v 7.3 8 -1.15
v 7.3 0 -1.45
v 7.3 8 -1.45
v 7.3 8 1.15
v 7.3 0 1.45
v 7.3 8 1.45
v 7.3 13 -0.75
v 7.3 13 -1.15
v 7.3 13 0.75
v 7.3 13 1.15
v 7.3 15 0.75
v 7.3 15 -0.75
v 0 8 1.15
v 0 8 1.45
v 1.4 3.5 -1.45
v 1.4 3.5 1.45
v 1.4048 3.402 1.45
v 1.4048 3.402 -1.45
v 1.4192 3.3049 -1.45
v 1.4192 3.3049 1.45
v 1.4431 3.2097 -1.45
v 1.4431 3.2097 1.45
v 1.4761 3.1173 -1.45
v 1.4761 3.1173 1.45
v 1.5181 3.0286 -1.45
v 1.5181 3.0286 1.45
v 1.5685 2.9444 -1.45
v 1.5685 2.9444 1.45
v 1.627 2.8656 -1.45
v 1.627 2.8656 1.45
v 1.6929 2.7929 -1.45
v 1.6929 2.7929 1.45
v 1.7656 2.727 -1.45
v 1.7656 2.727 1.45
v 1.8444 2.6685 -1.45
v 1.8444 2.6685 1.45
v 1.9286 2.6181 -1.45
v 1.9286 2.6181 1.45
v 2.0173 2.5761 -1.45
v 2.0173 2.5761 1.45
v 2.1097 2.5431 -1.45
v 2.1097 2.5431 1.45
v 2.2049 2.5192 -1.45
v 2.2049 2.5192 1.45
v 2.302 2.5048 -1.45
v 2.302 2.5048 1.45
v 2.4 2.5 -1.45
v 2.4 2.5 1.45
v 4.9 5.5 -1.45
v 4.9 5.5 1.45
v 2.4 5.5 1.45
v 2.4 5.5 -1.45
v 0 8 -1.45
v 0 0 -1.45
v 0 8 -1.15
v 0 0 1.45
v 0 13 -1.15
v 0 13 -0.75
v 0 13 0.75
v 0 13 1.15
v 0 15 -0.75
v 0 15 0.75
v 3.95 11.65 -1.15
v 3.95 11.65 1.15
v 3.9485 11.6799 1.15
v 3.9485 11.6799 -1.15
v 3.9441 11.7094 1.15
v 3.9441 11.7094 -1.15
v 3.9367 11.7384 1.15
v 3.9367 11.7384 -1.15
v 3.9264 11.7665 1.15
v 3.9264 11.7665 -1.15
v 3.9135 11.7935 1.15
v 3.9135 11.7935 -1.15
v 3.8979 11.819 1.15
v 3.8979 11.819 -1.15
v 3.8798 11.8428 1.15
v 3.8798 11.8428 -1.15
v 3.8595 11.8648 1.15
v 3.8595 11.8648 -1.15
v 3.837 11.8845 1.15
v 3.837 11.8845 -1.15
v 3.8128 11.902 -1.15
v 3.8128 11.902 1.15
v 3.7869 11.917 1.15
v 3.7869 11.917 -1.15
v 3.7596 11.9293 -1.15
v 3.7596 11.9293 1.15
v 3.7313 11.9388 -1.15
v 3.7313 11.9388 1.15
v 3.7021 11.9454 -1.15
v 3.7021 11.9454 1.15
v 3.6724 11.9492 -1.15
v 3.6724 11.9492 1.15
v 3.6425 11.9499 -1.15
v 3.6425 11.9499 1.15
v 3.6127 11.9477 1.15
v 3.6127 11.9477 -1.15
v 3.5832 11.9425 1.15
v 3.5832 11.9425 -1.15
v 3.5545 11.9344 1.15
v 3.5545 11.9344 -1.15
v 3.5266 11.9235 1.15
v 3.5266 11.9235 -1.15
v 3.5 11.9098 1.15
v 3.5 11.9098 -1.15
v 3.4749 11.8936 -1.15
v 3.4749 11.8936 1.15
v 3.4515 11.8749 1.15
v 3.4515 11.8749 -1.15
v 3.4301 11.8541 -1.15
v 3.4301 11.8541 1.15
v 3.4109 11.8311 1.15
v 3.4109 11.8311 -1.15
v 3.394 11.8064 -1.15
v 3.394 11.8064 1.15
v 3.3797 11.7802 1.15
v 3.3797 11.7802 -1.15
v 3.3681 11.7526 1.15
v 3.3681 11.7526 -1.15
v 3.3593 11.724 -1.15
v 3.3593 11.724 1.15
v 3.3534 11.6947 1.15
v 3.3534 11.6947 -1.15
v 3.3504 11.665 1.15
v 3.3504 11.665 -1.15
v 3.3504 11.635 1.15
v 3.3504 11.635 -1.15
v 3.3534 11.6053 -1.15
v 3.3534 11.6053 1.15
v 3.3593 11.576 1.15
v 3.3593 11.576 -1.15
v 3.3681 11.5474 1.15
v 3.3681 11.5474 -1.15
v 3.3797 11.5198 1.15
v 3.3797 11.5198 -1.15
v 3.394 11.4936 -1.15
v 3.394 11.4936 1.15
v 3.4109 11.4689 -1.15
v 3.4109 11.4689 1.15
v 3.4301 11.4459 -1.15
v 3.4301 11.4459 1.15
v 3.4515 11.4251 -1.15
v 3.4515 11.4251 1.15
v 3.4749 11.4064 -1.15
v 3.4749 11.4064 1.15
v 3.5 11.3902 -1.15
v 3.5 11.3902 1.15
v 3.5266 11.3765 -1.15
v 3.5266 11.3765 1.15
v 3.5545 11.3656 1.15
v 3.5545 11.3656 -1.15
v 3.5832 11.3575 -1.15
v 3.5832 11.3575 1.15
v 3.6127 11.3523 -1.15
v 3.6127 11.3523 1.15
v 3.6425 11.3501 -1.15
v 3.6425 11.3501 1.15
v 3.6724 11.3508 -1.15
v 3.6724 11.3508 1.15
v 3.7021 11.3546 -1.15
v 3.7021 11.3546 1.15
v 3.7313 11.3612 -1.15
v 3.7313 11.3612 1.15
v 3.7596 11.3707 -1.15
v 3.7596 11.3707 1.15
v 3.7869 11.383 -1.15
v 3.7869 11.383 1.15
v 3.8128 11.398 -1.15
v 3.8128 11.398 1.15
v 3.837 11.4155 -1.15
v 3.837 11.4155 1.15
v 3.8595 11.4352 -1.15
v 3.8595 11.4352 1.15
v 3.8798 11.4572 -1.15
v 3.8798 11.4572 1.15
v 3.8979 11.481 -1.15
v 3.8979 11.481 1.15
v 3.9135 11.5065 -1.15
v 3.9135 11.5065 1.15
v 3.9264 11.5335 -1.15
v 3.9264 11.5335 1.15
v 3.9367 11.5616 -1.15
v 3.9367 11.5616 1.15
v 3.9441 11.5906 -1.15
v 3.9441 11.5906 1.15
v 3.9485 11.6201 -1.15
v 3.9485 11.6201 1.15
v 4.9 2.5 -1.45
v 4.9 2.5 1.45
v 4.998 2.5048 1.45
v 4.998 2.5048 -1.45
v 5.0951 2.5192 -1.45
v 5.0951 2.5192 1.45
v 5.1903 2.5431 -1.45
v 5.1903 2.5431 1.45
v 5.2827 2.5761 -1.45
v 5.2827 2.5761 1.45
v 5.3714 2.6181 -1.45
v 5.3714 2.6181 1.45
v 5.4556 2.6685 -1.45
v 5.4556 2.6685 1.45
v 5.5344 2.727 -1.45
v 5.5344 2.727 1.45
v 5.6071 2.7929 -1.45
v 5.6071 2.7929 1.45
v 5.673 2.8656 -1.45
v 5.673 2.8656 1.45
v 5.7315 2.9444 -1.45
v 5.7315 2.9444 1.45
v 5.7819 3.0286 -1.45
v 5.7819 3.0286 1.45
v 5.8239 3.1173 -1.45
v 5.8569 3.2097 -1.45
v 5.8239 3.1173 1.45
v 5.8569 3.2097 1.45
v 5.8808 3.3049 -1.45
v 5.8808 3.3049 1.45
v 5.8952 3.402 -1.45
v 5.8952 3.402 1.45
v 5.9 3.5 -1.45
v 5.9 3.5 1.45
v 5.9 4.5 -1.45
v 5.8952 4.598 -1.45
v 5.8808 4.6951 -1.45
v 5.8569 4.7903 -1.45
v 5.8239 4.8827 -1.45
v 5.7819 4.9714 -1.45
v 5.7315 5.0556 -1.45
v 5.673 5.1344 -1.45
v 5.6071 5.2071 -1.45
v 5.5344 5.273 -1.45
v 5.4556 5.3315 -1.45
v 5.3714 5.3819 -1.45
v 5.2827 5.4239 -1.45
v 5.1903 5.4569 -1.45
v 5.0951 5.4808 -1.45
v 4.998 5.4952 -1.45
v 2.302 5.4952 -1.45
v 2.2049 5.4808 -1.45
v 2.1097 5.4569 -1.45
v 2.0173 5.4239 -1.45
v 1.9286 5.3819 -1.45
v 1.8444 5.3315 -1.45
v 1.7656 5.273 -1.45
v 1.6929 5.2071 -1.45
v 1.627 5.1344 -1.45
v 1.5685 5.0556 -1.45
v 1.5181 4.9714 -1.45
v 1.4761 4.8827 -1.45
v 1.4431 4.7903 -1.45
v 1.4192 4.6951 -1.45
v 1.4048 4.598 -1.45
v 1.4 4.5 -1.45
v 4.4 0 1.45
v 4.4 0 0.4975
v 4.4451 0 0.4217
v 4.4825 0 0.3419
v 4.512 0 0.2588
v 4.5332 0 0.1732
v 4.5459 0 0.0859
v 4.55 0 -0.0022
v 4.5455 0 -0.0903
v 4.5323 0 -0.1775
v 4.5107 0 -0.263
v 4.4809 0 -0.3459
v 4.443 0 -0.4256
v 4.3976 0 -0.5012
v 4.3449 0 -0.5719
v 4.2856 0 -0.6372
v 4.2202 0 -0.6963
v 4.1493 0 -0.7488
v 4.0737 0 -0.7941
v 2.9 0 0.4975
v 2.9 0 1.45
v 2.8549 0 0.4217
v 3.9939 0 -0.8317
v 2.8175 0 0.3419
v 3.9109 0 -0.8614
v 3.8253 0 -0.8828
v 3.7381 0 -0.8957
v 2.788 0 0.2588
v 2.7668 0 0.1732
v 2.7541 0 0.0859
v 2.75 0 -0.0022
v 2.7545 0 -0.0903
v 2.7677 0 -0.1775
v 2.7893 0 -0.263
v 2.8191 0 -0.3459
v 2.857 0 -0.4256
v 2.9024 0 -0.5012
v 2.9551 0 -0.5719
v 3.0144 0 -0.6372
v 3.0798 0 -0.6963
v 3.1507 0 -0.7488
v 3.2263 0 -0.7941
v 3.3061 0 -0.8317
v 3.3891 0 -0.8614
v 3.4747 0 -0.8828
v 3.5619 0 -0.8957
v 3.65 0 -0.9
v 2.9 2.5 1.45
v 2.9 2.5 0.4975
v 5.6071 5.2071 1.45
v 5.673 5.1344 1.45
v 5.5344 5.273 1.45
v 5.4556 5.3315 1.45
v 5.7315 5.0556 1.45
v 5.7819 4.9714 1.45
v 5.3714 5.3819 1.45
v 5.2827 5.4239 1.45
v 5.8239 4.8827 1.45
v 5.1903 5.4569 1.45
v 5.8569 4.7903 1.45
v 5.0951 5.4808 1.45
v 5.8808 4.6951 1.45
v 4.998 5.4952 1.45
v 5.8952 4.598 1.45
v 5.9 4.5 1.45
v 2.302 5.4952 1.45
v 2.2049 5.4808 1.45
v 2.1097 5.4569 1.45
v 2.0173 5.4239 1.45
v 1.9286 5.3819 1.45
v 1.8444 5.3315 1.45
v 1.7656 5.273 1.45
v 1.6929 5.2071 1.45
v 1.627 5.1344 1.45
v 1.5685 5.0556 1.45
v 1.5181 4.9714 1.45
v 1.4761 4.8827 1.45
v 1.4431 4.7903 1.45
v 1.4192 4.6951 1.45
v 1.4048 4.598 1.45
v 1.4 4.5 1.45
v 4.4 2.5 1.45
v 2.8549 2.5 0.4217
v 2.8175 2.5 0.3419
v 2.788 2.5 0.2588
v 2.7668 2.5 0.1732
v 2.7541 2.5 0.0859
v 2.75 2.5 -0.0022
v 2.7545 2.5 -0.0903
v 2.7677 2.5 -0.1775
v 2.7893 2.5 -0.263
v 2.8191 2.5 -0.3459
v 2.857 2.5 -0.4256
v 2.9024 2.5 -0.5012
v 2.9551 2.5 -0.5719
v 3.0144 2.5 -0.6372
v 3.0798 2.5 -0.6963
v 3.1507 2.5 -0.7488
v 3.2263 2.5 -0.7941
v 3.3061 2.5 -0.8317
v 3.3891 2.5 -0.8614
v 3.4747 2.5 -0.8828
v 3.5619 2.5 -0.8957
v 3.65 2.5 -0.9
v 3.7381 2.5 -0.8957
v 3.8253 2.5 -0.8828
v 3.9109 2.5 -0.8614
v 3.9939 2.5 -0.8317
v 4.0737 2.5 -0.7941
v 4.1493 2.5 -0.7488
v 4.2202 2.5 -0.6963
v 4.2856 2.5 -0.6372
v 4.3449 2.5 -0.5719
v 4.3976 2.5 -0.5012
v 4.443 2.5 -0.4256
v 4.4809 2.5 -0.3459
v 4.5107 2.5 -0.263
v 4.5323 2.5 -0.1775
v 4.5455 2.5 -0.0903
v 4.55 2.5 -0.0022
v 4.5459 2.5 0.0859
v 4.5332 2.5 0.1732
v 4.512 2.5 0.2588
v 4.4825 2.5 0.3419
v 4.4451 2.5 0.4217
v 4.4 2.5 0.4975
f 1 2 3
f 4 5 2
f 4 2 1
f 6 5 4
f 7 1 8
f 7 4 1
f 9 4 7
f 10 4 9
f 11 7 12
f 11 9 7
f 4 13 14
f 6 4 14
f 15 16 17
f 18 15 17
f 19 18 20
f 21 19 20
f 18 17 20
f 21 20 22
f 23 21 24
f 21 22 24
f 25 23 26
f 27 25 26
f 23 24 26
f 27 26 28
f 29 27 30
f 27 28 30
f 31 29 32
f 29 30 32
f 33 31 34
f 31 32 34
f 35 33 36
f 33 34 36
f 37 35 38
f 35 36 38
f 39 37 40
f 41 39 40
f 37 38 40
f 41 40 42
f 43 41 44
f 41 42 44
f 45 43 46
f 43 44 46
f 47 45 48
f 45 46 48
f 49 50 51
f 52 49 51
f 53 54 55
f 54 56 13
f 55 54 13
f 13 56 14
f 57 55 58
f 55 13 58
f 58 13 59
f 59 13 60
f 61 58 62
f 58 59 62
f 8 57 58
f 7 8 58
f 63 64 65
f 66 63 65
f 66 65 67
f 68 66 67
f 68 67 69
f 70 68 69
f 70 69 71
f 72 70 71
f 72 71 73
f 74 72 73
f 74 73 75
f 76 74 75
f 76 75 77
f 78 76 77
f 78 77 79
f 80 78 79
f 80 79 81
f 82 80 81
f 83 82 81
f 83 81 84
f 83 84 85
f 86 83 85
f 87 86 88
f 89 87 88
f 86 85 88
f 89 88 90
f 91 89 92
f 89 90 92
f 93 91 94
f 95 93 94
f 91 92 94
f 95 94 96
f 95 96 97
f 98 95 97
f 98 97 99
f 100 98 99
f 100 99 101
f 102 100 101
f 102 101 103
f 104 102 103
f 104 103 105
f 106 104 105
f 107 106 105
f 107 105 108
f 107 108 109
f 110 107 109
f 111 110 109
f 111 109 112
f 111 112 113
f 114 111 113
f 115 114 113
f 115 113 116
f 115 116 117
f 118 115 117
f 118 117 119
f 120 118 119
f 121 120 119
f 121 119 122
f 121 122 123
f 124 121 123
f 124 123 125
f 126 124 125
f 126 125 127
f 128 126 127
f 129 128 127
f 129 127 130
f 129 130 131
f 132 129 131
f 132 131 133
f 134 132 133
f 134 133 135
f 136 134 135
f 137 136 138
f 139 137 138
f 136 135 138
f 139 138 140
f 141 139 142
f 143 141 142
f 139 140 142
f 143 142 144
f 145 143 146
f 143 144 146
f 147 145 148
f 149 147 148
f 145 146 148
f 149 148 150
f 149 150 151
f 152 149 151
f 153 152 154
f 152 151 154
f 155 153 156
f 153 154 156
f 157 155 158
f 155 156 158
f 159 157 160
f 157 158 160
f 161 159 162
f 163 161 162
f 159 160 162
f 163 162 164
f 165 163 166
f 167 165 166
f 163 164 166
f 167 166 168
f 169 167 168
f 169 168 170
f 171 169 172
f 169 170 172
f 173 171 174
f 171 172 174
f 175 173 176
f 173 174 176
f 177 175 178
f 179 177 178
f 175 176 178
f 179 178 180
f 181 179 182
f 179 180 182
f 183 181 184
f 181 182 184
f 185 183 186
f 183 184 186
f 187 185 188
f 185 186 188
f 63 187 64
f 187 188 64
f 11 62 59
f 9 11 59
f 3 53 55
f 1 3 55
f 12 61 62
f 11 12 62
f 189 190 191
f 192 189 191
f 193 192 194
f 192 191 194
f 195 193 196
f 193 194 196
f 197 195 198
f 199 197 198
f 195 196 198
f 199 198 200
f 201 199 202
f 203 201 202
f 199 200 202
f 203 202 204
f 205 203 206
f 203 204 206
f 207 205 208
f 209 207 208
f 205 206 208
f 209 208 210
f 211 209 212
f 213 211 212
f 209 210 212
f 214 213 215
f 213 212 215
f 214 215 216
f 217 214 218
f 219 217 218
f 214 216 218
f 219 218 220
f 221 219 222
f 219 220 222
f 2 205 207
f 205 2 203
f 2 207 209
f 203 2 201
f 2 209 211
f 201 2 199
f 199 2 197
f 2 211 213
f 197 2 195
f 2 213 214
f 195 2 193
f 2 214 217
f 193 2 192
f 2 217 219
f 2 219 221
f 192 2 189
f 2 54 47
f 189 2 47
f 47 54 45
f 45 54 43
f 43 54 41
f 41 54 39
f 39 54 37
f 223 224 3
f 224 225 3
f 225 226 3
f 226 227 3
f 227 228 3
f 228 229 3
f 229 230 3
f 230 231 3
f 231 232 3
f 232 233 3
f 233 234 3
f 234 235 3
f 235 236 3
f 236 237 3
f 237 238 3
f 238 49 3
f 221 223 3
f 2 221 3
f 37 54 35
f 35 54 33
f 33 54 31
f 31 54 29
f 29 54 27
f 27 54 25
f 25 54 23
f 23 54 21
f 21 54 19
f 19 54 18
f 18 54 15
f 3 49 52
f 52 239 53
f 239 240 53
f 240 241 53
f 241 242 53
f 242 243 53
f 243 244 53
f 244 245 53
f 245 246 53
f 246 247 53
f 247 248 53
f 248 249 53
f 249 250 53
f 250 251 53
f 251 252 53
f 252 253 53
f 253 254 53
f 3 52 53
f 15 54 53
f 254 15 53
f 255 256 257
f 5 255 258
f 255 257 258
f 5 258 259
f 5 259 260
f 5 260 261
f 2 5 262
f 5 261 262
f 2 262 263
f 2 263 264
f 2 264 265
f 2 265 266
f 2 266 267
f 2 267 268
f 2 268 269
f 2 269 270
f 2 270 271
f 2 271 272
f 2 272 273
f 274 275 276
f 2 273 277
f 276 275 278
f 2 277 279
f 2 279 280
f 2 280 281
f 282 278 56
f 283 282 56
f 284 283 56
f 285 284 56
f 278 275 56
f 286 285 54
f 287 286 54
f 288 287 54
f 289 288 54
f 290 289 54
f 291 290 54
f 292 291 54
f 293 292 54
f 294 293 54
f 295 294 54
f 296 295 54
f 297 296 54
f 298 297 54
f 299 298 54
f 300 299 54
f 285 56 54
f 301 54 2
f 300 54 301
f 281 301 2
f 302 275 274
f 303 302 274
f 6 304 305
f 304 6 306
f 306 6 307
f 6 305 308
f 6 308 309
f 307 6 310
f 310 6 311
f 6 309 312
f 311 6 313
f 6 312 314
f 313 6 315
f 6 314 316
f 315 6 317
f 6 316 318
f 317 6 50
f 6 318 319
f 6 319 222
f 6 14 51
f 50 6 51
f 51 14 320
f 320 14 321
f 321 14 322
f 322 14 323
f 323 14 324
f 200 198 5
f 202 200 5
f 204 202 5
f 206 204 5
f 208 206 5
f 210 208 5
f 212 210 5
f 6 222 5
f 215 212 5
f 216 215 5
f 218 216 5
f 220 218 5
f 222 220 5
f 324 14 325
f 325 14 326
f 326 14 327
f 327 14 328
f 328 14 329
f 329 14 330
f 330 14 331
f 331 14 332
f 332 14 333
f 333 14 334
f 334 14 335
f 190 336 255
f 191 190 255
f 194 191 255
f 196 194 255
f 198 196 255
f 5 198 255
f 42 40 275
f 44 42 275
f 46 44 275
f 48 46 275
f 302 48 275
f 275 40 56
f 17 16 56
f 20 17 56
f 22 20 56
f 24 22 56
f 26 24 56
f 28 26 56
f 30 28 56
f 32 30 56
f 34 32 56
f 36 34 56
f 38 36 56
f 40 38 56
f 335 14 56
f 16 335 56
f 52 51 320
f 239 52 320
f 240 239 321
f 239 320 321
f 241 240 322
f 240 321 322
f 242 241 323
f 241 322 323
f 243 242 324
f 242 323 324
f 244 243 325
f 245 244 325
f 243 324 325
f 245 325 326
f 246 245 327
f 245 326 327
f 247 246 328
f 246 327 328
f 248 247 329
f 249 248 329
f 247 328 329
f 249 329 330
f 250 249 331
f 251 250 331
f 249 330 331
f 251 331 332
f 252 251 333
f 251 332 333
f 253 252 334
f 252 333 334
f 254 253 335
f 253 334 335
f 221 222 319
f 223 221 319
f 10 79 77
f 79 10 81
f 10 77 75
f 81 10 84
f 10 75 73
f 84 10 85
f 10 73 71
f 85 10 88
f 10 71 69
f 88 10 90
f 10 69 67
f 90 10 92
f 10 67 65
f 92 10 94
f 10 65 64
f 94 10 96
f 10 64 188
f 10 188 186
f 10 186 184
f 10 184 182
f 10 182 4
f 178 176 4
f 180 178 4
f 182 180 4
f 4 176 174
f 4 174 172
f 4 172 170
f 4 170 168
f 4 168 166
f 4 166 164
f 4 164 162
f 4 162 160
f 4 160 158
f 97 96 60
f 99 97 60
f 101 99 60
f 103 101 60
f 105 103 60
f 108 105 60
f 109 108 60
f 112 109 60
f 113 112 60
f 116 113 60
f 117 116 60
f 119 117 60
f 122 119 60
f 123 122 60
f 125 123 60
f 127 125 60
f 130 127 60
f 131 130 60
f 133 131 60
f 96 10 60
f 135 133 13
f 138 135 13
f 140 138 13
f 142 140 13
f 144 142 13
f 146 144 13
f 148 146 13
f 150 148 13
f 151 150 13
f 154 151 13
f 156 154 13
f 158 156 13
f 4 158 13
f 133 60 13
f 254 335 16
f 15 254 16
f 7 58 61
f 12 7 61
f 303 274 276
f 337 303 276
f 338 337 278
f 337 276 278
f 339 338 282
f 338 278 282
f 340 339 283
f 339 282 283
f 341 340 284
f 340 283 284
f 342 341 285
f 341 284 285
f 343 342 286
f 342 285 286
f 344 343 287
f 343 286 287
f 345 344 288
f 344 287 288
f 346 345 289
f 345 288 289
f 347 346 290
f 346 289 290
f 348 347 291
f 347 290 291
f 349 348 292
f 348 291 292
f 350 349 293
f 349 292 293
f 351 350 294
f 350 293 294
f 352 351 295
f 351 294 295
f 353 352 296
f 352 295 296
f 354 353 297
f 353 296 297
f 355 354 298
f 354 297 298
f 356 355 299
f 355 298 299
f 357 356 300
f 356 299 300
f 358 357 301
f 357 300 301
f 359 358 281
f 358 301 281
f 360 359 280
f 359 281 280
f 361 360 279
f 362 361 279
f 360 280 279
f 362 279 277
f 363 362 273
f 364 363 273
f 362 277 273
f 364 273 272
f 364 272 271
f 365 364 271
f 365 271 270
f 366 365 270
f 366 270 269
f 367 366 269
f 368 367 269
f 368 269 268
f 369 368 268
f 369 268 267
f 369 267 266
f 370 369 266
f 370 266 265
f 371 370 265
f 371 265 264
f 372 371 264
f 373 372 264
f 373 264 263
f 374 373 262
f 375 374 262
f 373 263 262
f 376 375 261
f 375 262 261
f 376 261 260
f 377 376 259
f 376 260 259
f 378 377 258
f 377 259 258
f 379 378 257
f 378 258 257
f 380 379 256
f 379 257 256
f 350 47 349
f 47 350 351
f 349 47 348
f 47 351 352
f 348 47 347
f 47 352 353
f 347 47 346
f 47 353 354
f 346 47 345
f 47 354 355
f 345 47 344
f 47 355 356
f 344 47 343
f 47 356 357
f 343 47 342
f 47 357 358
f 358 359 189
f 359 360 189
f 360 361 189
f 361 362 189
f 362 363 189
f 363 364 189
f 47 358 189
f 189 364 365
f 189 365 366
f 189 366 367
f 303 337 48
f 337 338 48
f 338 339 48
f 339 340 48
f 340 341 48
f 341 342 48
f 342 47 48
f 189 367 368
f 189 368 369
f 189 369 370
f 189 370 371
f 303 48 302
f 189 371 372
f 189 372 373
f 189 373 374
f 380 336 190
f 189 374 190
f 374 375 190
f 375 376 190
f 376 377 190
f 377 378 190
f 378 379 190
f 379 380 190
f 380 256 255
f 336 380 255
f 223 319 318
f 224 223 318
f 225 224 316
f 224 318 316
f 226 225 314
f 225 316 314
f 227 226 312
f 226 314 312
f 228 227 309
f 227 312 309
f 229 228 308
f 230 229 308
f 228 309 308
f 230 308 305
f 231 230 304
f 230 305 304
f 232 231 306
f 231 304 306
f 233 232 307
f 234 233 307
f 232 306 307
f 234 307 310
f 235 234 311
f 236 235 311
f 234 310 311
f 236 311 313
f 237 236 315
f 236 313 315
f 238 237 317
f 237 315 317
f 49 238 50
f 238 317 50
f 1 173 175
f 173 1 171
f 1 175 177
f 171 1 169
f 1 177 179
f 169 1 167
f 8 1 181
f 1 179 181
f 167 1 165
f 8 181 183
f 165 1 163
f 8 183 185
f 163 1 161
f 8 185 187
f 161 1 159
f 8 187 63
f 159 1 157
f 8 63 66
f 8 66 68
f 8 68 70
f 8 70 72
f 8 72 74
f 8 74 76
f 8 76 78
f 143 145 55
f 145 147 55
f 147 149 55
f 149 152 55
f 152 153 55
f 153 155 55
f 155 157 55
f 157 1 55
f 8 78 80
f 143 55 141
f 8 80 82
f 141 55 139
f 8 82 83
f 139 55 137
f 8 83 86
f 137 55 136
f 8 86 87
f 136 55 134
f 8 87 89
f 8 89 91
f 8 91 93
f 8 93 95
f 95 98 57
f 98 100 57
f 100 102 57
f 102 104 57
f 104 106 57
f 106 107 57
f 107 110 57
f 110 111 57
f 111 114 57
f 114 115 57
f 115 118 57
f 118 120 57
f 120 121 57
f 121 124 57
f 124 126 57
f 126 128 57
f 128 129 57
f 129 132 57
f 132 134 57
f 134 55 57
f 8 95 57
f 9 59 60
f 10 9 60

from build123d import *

# Parameters (mm, degrees)
F2_DEPTH = 7.3
F3_R     = 0.3
F4_DEPTH = 2.901
F6_DEPTH = 2.5


with BuildPart() as f2:
    # F1 (on Right) → F2 (new body)
    with BuildSketch(Plane.YZ):
        Polygon((0, 1.45), (0, 0), (0, -1.45), (8, -1.45), (8, -1.15), (13, -1.15), (13, -0.75), (15, -0.75), (15, 0), (15, 0.75), (13, 0.75), (13, 1.15), (8, 1.15), (8, 1.45), align=None)
    extrude(amount=F2_DEPTH)

    # F3 (on face) → F4 (cut, through all)
    with BuildSketch(Plane.XY.offset(1.45)):
        with BuildLine():
            ThreePointArc((1.4, 3.5), (1.6928932188, 2.7928932188), (2.4, 2.5))
            Line((2.4, 2.5), (4.9, 2.5))
            ThreePointArc((4.9, 2.5), (5.6071067812, 2.7928932188), (5.9, 3.5))
            Line((5.9, 3.5), (5.9, 4.5))
            ThreePointArc((5.9, 4.5), (5.6071067812, 5.2071067812), (4.9, 5.5))
            Line((4.9, 5.5), (2.4, 5.5))
            ThreePointArc((2.4, 5.5), (1.6928932188, 5.2071067812), (1.4, 4.5))
            Line((1.4, 4.5), (1.4, 3.5))
        make_face()
        with Locations((3.65, 11.65)):
            Circle(F3_R)
    extrude(amount=-F4_DEPTH, mode=Mode.SUBTRACT)

    # F5 (on face) → F6 (cut, through all)
    with BuildSketch(Plane.XZ):
        with BuildLine():
            Line((4.4, 1.45), (2.9, 1.45))
            Line((2.9, 1.45), (2.9, 0.4974937186))
            ThreePointArc((2.9, 0.4974937186), (3.65, -0.9), (4.4, 0.4974937186))
            Line((4.4, 0.4974937186), (4.4, 1.45))
        make_face()
    extrude(amount=-F6_DEPTH, mode=Mode.SUBTRACT)


solid = f2.part
